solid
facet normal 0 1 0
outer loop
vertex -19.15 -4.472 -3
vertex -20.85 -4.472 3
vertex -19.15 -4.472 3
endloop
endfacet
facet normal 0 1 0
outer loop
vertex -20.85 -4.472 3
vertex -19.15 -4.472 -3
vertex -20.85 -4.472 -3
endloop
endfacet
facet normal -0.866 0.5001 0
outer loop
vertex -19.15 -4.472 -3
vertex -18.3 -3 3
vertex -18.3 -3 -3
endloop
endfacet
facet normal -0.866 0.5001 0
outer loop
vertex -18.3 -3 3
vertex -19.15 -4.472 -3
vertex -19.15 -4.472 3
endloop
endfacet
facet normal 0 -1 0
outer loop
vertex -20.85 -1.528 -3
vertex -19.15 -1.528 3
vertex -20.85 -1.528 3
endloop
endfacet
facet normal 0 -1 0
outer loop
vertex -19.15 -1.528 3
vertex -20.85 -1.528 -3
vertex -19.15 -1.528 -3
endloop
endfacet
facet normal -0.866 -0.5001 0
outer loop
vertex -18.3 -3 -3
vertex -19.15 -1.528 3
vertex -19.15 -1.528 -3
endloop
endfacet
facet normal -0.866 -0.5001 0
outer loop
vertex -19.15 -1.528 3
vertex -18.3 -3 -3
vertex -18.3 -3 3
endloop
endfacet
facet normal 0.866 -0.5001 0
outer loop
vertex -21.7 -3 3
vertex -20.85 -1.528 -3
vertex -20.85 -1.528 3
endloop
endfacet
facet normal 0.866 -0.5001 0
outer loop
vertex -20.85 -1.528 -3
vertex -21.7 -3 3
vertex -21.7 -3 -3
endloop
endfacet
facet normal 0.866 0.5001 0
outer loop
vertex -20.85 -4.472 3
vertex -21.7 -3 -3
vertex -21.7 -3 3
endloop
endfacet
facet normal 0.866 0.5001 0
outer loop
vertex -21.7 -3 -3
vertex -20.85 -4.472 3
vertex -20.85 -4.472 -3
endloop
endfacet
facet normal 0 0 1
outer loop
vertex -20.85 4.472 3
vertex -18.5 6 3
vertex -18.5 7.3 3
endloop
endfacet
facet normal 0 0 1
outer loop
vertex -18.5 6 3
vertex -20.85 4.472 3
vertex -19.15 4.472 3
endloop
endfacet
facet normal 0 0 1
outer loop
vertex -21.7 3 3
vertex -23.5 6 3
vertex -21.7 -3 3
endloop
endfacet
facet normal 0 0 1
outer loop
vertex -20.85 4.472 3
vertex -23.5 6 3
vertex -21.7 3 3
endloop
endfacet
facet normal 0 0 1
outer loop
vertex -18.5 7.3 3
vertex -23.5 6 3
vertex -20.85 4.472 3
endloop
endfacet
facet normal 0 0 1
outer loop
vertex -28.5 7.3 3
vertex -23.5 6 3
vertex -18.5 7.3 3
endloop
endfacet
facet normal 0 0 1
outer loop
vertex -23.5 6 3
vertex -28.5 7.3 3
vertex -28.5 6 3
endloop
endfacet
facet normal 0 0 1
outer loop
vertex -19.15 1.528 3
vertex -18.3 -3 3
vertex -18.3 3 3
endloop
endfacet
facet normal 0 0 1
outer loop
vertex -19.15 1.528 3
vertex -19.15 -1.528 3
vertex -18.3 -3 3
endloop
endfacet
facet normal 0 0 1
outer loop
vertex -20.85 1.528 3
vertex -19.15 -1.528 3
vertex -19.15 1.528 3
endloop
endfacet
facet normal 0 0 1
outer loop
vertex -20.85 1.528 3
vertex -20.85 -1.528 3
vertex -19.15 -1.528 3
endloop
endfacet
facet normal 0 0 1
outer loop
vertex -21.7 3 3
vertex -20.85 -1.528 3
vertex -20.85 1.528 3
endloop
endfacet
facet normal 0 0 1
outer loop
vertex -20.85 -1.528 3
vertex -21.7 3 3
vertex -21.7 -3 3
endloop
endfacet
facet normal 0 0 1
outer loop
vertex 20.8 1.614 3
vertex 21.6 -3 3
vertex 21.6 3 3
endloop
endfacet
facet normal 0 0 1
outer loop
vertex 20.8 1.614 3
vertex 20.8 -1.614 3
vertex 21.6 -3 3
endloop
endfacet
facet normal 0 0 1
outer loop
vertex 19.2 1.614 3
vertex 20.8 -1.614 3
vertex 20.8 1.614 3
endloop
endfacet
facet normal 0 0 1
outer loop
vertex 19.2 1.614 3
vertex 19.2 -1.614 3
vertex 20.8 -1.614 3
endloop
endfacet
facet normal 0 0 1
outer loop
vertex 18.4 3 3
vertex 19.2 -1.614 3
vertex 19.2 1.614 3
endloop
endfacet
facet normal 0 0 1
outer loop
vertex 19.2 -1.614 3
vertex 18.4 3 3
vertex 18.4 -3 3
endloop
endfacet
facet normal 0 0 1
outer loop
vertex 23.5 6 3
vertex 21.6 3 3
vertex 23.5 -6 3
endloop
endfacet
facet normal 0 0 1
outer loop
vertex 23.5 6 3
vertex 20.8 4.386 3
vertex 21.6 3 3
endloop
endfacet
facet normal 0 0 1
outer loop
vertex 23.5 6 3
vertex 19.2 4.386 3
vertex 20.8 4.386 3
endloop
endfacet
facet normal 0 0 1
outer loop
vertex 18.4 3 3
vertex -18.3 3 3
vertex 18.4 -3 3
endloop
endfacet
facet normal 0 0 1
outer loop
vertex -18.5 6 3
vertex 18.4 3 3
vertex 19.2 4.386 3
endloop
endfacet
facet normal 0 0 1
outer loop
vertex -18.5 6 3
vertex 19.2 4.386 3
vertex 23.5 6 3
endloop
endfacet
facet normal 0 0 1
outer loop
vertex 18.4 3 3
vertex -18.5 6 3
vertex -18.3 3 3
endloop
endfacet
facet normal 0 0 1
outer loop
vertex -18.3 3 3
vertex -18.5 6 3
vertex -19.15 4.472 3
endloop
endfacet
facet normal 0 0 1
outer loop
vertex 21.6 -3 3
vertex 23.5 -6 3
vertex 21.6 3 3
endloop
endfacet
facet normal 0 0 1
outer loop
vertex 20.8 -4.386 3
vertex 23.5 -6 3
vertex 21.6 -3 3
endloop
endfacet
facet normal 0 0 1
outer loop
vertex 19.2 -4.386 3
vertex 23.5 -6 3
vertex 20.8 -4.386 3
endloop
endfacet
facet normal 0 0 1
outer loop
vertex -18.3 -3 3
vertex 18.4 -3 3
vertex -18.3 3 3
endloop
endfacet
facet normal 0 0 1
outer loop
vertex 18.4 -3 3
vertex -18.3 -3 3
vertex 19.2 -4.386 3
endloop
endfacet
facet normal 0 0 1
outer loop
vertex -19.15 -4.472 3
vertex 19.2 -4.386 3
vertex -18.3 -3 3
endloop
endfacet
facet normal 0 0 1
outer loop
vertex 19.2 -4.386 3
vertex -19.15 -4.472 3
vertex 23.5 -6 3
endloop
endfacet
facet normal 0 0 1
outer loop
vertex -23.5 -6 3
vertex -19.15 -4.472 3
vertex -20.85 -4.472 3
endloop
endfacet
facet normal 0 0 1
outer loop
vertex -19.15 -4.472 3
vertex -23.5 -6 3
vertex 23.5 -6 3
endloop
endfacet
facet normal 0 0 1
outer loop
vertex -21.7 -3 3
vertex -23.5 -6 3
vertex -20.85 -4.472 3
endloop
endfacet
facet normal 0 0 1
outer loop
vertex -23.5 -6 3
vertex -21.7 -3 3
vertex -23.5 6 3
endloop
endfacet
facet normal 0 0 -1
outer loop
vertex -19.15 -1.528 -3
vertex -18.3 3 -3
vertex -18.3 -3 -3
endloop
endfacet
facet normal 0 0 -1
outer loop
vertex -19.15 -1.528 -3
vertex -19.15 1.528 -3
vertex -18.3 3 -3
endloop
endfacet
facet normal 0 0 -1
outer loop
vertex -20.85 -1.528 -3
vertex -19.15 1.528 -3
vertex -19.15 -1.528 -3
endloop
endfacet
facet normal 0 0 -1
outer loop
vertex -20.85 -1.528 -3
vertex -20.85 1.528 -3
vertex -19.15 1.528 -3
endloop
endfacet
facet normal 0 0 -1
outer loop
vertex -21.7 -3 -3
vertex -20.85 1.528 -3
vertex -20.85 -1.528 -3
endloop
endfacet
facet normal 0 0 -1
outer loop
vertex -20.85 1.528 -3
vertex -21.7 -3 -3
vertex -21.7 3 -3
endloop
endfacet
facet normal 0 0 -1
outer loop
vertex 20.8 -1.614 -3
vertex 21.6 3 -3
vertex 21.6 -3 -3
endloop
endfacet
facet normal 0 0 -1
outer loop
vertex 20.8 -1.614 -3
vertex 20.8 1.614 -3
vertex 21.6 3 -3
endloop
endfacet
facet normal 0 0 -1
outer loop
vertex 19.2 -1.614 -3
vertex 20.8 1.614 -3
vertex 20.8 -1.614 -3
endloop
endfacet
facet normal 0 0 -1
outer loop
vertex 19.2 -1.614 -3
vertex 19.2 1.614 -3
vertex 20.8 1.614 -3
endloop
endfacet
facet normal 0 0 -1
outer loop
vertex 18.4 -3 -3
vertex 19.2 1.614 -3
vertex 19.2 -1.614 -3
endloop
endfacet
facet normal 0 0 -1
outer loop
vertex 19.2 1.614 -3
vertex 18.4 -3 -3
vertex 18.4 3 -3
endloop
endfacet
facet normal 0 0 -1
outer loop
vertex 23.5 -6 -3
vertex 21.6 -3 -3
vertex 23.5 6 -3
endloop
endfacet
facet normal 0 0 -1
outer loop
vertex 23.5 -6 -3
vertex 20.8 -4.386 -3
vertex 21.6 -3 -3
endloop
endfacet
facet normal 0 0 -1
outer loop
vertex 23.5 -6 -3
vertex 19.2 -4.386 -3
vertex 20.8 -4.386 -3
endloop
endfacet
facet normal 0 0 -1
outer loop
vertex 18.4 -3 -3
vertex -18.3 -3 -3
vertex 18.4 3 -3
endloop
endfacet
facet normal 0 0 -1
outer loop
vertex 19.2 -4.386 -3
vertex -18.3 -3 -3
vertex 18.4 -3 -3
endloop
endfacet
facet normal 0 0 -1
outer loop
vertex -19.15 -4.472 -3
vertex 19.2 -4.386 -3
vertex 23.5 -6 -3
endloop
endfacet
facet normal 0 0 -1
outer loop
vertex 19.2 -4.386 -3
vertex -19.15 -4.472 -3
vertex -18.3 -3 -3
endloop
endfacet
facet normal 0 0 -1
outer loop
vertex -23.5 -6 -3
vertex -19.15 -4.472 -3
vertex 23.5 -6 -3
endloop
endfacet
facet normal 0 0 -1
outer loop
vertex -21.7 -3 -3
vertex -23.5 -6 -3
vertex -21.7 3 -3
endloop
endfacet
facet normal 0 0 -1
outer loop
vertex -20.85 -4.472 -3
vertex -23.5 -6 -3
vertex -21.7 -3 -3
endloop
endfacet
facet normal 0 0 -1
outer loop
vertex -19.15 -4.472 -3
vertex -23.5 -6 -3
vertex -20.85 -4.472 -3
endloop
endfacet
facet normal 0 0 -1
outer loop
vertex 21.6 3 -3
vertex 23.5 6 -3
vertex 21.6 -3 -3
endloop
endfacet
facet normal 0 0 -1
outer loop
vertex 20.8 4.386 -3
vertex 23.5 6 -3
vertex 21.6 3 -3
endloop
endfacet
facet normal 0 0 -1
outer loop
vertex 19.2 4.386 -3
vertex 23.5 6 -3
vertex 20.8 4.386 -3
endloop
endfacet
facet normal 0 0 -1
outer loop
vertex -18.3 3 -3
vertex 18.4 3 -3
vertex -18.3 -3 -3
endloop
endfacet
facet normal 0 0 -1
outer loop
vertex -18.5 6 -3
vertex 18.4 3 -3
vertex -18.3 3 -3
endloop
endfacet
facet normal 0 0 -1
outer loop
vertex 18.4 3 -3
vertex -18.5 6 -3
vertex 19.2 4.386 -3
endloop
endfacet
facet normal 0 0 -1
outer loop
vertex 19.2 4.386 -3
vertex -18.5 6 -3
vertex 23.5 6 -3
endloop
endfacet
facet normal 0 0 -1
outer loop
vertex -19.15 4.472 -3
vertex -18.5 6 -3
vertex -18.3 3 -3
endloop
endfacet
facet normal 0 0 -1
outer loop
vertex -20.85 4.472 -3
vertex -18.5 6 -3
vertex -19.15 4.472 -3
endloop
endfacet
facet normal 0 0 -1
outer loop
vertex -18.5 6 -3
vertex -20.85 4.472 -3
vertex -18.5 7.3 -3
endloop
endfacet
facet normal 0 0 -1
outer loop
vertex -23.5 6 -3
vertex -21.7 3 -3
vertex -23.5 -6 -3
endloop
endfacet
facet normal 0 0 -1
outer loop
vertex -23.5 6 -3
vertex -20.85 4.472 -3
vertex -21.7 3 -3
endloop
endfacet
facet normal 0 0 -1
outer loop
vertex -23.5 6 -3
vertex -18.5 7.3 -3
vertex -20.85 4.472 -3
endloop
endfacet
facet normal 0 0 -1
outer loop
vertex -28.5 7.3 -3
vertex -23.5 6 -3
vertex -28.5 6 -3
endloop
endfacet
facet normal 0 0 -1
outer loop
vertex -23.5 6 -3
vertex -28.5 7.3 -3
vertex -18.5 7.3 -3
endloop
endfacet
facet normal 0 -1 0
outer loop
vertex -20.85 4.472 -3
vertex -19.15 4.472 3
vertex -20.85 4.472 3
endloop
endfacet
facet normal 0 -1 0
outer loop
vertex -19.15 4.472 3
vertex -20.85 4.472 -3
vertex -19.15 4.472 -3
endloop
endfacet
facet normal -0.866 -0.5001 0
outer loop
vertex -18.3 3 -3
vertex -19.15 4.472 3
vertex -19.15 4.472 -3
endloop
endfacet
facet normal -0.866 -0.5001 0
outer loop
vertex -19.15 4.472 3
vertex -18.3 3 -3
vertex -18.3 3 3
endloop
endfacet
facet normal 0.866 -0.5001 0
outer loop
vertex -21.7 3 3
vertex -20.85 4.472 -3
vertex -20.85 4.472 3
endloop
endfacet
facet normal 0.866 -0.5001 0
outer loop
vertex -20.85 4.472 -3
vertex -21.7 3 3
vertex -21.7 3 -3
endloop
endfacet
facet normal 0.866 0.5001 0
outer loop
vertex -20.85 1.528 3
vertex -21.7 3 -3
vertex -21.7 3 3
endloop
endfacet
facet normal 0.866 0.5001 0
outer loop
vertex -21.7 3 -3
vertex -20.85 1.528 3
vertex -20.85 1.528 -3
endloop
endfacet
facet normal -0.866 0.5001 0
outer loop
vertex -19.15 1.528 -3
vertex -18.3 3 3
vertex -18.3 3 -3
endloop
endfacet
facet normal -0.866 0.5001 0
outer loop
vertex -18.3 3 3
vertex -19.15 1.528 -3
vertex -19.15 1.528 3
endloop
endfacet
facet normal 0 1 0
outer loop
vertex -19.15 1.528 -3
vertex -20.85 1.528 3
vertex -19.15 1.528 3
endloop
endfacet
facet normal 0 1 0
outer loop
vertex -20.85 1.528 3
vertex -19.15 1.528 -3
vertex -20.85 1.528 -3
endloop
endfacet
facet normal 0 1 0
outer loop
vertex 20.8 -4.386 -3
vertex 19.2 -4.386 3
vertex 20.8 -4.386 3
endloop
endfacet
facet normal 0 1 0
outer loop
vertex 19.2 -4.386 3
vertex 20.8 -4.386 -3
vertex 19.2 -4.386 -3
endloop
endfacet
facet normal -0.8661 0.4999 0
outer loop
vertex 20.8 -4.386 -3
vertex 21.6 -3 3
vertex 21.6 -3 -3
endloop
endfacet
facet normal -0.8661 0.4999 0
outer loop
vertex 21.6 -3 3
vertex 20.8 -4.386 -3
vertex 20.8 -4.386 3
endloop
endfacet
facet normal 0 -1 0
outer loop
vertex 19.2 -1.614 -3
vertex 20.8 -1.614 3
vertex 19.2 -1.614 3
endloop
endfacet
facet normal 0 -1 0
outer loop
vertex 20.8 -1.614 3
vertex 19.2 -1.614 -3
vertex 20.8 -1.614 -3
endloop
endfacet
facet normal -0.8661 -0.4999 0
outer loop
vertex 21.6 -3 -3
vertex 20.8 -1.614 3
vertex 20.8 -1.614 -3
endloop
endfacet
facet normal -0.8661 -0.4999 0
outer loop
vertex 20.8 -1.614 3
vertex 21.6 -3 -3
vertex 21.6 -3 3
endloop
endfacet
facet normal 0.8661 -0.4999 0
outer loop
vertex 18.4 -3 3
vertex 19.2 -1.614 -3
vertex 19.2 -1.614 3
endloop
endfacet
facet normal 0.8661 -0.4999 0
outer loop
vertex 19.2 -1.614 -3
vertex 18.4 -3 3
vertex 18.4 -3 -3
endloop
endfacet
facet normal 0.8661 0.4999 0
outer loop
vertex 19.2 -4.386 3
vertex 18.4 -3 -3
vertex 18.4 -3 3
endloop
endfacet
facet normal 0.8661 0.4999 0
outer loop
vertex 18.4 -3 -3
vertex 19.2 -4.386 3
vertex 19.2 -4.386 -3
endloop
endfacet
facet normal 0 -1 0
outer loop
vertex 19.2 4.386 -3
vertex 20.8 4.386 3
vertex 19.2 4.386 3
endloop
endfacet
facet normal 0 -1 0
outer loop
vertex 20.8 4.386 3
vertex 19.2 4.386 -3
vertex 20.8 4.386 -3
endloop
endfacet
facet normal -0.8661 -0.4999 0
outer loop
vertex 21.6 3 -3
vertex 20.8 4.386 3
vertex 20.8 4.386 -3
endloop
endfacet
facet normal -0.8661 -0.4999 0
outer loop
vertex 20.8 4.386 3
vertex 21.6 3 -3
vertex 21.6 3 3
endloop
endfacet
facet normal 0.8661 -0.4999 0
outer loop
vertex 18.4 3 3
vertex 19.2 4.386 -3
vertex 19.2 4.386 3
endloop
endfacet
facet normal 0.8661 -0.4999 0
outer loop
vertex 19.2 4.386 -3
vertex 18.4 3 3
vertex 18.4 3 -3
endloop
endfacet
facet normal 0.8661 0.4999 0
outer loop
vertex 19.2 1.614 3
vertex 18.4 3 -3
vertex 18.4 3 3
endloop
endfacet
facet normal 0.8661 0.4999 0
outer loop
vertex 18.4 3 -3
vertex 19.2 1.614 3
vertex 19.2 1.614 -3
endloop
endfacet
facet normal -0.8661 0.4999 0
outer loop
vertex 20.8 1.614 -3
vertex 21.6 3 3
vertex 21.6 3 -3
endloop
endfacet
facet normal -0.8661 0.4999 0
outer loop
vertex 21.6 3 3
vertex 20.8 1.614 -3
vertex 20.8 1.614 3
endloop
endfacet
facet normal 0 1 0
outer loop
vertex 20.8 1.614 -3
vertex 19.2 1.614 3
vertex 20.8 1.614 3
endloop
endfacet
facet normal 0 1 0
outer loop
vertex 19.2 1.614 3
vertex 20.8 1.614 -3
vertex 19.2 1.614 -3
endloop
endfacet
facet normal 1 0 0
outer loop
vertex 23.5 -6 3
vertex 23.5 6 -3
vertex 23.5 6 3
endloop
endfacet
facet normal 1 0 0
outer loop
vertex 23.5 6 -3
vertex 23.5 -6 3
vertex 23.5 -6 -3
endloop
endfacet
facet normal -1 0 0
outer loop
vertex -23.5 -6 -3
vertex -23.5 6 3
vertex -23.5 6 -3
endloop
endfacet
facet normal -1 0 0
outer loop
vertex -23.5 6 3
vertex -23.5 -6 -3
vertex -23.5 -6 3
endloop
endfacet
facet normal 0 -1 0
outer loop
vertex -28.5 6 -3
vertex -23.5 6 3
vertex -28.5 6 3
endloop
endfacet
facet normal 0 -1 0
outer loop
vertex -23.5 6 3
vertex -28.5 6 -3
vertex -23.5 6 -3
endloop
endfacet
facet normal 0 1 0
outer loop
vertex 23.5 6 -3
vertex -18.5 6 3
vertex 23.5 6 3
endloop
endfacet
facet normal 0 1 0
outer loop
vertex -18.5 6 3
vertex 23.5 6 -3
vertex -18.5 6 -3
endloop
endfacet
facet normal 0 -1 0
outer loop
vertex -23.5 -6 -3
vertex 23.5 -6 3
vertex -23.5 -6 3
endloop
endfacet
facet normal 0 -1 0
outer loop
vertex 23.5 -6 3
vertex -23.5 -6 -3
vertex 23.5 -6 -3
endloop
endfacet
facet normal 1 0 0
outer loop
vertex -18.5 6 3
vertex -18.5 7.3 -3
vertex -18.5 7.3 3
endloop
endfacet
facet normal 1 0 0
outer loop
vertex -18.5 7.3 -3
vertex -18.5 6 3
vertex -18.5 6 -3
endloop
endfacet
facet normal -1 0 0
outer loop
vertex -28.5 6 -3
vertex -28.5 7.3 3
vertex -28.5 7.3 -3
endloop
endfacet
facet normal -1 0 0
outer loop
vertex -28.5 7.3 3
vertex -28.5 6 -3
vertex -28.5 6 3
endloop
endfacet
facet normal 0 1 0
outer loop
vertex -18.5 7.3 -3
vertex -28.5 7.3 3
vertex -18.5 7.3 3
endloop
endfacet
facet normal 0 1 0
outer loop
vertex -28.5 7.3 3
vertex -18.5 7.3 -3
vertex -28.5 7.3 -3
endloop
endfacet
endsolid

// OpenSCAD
/* TAL221 Load Cell - Basic dimensional representation of the TAL220
    Copyright (C) 2019 Benjamin Hubbard

    This program is free software: you can redistribute it and/or modify
    it under the terms of the GNU General Public License as published by
    the Free Software Foundation, either version 3 of the License, or
    (at your option) any later version.

    This program is distributed in the hope that it will be useful,
    but WITHOUT ANY WARRANTY; without even the implied warranty of
    MERCHANTABILITY or FITNESS FOR A PARTICULAR PURPOSE.  See the
    GNU General Public License for more details.

    You should have received a copy of the GNU General Public License
    along with this program.  If not, see <https://www.gnu.org/licenses/>.
 */

TAL221();

module TAL221()
{
    // Outer Dimensions (l, w, h)
    dim = [ 47, 12, 6 ];

    // Hole locations.
    holeX = [ -20, -20, 20, 20 ];
    holeY = [ -3, 3, -3, 3 ];

    // Hole diameters (M4, M4, M5, M5).
    diam = [ 3.4, 3.4, 3.2, 3.2 ];

    // Strain gage cables.
    cableThickness = 1.3;

    // Make the TAL220, centroid at the origin.
    difference()
    {
        cube(dim, center = true);
        for (i = [0:3])
        {
            translate([ holeX[i], holeY[i], 0 ]) cylinder(d = diam[i], h = dim[2], center = true);
        }
    }

    // Add cable stuff.
    translate([ -dim[0] / 2, dim[1] / 2 + cableThickness / 2, 0 ]) cube([ 10, cableThickness, dim[2] ], center = true);
}
